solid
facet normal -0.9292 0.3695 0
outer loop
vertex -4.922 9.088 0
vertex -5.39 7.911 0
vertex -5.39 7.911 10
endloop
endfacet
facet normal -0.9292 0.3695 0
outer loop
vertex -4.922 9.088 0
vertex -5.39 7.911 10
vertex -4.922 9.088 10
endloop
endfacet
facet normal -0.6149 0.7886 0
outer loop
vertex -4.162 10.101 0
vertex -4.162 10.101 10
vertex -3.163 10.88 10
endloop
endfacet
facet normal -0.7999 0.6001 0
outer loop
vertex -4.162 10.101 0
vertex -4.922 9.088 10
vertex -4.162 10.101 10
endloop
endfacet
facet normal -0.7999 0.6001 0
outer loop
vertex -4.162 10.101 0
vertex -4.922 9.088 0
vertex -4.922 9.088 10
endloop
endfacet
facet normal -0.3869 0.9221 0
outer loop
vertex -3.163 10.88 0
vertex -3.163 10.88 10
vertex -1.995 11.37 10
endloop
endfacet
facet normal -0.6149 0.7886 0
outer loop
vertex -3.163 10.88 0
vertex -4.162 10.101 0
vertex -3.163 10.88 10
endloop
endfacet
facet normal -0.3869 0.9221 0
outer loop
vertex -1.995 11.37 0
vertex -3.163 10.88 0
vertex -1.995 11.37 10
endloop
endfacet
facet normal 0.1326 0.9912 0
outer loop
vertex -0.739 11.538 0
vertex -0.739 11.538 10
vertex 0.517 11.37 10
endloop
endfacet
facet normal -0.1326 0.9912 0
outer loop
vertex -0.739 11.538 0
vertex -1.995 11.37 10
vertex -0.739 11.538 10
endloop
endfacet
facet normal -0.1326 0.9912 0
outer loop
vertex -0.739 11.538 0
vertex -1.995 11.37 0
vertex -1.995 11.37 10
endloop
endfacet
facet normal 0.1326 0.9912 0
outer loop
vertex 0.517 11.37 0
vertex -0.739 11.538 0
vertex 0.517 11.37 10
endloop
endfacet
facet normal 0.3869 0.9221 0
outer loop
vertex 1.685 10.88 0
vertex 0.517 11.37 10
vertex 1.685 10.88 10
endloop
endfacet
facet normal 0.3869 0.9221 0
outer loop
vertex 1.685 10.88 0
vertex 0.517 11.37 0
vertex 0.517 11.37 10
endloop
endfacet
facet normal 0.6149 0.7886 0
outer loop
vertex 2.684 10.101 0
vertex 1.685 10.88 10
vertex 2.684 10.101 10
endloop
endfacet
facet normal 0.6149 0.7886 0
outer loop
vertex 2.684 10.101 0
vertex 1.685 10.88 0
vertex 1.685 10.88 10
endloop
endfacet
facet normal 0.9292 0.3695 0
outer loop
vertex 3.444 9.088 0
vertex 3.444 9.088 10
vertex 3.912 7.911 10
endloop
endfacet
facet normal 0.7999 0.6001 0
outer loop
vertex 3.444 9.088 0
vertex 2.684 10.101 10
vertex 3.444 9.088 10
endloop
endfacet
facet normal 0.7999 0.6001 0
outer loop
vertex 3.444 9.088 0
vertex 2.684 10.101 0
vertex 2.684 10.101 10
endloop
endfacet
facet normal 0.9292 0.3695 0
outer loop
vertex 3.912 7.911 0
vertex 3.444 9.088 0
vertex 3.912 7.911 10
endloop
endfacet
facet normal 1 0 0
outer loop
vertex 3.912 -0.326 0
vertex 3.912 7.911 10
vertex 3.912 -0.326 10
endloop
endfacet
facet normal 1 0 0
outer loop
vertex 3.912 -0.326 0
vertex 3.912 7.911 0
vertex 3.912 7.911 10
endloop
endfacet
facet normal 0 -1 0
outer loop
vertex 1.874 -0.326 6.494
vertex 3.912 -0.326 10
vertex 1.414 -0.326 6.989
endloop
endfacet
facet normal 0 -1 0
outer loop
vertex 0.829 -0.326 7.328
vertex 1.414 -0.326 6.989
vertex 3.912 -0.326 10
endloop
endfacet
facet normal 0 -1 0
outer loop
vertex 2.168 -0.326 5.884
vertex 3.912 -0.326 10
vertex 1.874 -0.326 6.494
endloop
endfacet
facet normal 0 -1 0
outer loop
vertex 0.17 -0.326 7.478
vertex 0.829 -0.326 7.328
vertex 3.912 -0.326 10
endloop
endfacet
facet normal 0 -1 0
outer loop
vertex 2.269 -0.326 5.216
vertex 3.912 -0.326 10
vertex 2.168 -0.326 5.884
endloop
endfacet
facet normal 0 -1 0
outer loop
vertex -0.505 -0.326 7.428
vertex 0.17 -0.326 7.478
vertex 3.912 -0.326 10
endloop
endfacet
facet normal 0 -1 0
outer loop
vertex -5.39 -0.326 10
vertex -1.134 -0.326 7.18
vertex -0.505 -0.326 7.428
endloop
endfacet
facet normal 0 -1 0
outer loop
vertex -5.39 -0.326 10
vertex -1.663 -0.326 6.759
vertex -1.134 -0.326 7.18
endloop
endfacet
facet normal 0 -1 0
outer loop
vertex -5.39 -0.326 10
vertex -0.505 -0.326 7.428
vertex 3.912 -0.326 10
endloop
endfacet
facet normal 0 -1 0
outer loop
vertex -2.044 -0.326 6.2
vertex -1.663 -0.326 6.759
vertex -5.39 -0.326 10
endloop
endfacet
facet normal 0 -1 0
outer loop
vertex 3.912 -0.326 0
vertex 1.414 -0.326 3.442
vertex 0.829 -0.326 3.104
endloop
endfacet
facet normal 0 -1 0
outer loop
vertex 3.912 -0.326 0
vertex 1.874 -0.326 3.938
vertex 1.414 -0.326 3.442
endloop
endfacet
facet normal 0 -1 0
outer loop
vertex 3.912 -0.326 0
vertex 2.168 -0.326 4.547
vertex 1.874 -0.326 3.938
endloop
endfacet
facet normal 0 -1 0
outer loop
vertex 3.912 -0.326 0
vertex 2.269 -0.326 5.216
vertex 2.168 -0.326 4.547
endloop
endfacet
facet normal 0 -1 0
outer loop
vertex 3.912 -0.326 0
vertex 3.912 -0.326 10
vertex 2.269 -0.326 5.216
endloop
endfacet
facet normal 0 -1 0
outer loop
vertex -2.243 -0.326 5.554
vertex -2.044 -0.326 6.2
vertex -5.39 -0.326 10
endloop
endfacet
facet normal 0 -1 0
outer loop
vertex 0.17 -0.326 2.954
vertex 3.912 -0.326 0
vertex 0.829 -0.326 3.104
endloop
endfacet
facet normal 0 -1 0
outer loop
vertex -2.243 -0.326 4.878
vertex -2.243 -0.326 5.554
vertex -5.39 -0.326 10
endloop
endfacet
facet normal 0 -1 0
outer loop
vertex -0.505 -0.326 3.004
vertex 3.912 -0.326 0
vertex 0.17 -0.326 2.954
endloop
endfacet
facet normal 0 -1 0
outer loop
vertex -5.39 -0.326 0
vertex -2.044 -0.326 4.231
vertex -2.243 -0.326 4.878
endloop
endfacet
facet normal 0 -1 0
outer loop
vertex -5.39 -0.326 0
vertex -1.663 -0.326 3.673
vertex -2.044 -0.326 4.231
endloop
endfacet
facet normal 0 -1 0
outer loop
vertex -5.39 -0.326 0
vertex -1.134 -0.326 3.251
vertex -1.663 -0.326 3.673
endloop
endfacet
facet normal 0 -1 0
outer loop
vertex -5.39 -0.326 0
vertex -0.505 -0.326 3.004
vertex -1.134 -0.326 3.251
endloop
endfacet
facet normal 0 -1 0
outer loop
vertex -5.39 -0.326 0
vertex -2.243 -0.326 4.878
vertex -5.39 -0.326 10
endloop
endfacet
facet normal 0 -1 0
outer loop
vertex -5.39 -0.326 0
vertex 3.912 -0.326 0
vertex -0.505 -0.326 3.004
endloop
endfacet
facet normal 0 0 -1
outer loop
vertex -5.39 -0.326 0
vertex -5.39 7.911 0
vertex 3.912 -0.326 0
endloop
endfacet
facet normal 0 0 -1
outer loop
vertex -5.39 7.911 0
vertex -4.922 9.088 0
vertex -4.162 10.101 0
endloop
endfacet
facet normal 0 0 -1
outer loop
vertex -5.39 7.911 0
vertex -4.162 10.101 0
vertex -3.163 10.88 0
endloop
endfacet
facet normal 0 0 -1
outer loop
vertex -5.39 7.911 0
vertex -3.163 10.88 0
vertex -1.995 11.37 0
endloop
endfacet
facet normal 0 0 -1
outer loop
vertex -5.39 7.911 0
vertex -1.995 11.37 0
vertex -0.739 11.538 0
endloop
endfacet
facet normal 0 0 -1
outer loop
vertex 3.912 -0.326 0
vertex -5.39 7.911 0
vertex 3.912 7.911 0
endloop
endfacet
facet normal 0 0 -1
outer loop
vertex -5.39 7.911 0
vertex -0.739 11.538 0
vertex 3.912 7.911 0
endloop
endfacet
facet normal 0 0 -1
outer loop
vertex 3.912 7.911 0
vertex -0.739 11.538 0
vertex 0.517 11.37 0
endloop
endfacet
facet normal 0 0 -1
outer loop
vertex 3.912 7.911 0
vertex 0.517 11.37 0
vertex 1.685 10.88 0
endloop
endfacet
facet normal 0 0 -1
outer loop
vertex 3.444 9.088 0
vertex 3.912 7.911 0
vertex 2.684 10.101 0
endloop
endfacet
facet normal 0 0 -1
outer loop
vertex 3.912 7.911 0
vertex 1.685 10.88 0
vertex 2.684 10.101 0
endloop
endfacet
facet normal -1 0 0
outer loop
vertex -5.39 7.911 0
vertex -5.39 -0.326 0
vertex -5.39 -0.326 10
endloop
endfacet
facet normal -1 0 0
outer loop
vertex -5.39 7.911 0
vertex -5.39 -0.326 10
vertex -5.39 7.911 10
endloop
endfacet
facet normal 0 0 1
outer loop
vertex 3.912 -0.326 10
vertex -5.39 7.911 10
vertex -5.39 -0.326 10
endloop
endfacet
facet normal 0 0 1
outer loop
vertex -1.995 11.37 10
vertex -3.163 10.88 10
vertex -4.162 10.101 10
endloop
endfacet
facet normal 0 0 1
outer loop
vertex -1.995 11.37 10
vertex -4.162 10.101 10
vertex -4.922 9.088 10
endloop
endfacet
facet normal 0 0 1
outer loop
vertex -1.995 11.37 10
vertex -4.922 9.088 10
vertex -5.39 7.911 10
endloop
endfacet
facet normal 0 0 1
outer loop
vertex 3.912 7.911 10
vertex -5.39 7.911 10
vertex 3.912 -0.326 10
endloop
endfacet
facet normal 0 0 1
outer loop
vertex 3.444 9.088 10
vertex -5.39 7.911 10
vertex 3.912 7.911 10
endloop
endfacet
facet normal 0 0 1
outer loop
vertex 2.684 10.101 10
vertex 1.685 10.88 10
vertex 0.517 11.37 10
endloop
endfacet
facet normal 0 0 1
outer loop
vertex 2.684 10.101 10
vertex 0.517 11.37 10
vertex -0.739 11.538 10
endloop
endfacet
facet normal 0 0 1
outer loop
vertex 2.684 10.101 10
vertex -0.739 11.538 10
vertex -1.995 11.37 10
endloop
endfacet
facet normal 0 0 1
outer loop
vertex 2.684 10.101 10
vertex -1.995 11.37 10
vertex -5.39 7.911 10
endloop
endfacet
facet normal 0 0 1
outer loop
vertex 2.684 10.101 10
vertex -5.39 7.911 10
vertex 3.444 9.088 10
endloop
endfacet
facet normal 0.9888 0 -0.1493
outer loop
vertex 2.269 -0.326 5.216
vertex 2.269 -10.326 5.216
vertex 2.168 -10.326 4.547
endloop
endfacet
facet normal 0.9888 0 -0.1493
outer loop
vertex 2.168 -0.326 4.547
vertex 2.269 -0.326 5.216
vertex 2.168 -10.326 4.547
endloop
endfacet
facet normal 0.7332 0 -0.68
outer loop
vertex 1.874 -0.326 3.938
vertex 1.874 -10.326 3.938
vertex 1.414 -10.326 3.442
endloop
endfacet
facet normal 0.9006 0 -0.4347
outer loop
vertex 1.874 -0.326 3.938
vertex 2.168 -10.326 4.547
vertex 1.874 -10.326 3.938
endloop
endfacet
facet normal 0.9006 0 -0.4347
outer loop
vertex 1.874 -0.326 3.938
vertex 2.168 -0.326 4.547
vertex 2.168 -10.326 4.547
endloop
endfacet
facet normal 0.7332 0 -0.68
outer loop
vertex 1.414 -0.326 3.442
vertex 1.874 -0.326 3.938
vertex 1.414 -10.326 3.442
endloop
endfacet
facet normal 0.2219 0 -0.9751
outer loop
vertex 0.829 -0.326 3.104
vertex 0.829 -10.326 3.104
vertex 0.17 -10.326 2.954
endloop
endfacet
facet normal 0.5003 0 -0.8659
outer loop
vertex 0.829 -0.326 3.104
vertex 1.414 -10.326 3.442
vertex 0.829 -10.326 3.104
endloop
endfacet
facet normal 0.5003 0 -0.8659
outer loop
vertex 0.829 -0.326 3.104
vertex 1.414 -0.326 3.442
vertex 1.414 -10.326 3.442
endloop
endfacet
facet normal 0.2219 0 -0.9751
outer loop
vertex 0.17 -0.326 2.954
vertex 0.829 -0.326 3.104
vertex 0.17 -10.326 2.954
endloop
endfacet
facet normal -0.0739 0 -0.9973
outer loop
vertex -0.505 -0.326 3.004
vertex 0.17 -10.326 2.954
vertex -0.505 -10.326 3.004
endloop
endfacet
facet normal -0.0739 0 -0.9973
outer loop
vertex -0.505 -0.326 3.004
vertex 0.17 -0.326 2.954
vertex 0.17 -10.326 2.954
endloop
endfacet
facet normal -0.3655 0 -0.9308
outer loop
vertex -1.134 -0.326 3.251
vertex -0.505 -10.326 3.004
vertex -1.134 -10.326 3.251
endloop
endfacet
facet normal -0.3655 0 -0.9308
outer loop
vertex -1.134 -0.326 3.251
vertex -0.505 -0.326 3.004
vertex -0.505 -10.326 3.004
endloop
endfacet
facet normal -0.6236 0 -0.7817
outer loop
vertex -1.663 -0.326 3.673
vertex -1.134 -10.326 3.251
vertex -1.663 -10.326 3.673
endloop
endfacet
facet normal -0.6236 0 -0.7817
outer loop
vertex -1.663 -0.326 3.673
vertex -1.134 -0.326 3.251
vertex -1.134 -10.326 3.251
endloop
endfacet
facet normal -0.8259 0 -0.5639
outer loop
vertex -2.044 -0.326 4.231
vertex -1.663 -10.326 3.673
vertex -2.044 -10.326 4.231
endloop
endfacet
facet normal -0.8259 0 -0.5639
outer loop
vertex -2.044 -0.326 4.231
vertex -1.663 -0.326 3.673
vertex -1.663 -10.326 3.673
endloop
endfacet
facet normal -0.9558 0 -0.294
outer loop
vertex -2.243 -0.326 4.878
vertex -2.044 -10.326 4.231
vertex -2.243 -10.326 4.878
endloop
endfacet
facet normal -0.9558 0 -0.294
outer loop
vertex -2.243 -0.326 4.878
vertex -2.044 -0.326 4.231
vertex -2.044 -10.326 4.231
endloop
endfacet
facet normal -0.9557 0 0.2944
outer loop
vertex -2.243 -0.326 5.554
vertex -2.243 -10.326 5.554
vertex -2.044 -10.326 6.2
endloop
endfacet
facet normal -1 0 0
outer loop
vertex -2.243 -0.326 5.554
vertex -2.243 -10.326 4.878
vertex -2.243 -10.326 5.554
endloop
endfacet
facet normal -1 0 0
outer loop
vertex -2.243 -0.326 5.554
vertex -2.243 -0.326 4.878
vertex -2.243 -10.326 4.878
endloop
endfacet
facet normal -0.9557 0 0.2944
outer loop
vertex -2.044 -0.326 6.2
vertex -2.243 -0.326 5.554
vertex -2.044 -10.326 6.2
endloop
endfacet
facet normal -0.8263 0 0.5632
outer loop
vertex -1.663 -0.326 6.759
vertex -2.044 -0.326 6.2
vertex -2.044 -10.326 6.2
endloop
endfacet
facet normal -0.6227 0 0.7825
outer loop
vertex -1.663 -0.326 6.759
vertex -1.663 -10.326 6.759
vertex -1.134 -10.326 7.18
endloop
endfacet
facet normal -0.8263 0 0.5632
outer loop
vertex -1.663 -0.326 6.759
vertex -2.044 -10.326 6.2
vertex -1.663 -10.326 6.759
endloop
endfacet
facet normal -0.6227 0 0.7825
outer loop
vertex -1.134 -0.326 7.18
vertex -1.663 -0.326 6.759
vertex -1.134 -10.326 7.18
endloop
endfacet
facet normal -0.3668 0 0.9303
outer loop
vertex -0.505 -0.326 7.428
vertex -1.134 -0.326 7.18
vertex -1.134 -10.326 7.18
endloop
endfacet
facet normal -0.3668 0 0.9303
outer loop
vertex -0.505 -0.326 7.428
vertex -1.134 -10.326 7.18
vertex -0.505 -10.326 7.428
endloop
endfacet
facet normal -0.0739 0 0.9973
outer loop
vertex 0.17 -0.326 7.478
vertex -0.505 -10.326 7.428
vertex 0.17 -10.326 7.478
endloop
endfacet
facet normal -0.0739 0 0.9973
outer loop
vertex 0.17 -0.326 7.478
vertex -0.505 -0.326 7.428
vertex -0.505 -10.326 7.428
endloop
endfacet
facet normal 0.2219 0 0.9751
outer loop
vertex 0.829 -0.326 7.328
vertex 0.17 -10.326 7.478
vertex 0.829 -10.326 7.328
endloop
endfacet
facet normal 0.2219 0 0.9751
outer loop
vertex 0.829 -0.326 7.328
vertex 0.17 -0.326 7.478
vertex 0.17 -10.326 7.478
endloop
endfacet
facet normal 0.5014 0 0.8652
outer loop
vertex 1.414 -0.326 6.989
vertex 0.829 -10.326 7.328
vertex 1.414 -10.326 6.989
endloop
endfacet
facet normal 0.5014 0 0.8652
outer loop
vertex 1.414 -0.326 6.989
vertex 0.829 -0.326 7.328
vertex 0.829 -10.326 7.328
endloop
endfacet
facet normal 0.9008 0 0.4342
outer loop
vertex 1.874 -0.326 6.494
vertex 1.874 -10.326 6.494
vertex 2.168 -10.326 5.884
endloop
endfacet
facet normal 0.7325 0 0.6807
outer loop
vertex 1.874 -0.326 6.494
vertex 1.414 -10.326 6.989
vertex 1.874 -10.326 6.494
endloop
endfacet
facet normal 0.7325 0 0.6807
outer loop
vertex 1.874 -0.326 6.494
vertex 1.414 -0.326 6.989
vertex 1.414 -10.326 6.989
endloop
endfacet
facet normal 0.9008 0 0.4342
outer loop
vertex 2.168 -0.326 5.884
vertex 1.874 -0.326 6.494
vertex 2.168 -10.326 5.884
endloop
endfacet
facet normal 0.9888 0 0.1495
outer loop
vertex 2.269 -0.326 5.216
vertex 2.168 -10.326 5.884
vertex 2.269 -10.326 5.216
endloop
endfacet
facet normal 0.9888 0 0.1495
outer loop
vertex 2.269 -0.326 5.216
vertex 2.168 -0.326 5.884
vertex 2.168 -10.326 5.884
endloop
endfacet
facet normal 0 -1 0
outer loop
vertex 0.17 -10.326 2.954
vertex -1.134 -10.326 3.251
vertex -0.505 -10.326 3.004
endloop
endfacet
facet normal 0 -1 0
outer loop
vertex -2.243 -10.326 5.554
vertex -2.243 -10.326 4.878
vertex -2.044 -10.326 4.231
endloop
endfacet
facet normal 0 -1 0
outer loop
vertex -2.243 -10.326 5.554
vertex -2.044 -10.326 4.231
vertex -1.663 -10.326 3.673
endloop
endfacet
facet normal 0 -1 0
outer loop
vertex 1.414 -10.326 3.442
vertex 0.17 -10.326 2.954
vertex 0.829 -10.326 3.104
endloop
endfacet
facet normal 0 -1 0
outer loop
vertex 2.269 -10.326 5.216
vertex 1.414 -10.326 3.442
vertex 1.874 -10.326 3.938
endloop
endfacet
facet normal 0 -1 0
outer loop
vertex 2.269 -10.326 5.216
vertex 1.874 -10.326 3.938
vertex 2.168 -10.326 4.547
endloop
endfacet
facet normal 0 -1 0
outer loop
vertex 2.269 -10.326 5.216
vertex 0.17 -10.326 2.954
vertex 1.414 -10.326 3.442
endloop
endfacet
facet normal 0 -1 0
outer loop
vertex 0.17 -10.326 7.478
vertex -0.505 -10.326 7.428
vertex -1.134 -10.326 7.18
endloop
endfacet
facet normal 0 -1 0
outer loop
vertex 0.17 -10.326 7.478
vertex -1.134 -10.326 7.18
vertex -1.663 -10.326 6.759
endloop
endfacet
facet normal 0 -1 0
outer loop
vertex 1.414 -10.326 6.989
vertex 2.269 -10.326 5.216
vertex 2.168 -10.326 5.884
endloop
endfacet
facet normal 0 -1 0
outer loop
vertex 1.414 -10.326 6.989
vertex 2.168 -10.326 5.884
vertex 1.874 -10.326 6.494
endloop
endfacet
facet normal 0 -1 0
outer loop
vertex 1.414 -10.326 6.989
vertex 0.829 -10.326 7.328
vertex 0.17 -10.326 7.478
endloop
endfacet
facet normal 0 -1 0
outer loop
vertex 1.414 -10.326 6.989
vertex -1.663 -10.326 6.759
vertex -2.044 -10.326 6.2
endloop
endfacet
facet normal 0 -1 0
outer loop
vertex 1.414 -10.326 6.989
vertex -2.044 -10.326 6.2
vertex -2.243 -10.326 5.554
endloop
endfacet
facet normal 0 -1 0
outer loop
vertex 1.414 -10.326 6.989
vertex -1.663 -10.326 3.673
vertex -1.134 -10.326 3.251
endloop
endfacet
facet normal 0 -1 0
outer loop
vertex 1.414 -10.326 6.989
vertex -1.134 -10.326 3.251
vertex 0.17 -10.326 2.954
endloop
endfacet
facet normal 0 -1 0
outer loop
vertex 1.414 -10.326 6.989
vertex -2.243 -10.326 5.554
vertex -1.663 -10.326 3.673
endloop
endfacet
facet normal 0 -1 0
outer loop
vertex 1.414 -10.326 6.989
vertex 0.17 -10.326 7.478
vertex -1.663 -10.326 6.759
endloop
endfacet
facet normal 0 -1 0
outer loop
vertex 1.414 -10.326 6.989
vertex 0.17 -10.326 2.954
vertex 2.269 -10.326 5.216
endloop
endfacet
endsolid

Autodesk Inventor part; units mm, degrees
ref_plane "YZ Plane" through (0, 0, 0) normal (1, 0, 0) x (0, 1, 0)
ref_plane "XZ Plane" through (0, 0, 0) normal (0, 1, 0) x (-1, 0, 0)
ref_plane "XY Plane" through (0, 0, 0) normal (0, 0, 1) x (1, 0, 0)
sketch "Sketch1" plane through (0, 0, 0) normal (0, 0, 1) x (1, 0, 0)
  arc A0 (3.9123, 7.9106) -> (-5.3901, 7.9106) centre (-0.7389, 6.7419) ccw
  line L0 (3.9123, 7.9106) -> (-5.3901, 7.9106)
  line L1 (-5.3901, 7.9106) -> (3.9123, 7.9106)
  line L2 (3.9123, 7.9106) -> (3.9123, -0.326)
  line L3 (3.9123, -0.326) -> (-5.3901, -0.326)
  line L4 (-5.3901, -0.326) -> (-5.3901, 7.9106)
  point P0 (0, 0)
extrude "Extrusion1" add sketch "Sketch1" along normal blind 10
sketch "Sketch2" plane through (-5.3901, -0.326, 0) normal (0, -1, 0) x (1, 0, 0)
  circle A0 centre (5.3901, 5.2158) radius 2.2686
  point P0 (5.3901, 0)
extrude "Extrusion2" add sketch "Sketch2" along normal blind 10
properties part number "led"
